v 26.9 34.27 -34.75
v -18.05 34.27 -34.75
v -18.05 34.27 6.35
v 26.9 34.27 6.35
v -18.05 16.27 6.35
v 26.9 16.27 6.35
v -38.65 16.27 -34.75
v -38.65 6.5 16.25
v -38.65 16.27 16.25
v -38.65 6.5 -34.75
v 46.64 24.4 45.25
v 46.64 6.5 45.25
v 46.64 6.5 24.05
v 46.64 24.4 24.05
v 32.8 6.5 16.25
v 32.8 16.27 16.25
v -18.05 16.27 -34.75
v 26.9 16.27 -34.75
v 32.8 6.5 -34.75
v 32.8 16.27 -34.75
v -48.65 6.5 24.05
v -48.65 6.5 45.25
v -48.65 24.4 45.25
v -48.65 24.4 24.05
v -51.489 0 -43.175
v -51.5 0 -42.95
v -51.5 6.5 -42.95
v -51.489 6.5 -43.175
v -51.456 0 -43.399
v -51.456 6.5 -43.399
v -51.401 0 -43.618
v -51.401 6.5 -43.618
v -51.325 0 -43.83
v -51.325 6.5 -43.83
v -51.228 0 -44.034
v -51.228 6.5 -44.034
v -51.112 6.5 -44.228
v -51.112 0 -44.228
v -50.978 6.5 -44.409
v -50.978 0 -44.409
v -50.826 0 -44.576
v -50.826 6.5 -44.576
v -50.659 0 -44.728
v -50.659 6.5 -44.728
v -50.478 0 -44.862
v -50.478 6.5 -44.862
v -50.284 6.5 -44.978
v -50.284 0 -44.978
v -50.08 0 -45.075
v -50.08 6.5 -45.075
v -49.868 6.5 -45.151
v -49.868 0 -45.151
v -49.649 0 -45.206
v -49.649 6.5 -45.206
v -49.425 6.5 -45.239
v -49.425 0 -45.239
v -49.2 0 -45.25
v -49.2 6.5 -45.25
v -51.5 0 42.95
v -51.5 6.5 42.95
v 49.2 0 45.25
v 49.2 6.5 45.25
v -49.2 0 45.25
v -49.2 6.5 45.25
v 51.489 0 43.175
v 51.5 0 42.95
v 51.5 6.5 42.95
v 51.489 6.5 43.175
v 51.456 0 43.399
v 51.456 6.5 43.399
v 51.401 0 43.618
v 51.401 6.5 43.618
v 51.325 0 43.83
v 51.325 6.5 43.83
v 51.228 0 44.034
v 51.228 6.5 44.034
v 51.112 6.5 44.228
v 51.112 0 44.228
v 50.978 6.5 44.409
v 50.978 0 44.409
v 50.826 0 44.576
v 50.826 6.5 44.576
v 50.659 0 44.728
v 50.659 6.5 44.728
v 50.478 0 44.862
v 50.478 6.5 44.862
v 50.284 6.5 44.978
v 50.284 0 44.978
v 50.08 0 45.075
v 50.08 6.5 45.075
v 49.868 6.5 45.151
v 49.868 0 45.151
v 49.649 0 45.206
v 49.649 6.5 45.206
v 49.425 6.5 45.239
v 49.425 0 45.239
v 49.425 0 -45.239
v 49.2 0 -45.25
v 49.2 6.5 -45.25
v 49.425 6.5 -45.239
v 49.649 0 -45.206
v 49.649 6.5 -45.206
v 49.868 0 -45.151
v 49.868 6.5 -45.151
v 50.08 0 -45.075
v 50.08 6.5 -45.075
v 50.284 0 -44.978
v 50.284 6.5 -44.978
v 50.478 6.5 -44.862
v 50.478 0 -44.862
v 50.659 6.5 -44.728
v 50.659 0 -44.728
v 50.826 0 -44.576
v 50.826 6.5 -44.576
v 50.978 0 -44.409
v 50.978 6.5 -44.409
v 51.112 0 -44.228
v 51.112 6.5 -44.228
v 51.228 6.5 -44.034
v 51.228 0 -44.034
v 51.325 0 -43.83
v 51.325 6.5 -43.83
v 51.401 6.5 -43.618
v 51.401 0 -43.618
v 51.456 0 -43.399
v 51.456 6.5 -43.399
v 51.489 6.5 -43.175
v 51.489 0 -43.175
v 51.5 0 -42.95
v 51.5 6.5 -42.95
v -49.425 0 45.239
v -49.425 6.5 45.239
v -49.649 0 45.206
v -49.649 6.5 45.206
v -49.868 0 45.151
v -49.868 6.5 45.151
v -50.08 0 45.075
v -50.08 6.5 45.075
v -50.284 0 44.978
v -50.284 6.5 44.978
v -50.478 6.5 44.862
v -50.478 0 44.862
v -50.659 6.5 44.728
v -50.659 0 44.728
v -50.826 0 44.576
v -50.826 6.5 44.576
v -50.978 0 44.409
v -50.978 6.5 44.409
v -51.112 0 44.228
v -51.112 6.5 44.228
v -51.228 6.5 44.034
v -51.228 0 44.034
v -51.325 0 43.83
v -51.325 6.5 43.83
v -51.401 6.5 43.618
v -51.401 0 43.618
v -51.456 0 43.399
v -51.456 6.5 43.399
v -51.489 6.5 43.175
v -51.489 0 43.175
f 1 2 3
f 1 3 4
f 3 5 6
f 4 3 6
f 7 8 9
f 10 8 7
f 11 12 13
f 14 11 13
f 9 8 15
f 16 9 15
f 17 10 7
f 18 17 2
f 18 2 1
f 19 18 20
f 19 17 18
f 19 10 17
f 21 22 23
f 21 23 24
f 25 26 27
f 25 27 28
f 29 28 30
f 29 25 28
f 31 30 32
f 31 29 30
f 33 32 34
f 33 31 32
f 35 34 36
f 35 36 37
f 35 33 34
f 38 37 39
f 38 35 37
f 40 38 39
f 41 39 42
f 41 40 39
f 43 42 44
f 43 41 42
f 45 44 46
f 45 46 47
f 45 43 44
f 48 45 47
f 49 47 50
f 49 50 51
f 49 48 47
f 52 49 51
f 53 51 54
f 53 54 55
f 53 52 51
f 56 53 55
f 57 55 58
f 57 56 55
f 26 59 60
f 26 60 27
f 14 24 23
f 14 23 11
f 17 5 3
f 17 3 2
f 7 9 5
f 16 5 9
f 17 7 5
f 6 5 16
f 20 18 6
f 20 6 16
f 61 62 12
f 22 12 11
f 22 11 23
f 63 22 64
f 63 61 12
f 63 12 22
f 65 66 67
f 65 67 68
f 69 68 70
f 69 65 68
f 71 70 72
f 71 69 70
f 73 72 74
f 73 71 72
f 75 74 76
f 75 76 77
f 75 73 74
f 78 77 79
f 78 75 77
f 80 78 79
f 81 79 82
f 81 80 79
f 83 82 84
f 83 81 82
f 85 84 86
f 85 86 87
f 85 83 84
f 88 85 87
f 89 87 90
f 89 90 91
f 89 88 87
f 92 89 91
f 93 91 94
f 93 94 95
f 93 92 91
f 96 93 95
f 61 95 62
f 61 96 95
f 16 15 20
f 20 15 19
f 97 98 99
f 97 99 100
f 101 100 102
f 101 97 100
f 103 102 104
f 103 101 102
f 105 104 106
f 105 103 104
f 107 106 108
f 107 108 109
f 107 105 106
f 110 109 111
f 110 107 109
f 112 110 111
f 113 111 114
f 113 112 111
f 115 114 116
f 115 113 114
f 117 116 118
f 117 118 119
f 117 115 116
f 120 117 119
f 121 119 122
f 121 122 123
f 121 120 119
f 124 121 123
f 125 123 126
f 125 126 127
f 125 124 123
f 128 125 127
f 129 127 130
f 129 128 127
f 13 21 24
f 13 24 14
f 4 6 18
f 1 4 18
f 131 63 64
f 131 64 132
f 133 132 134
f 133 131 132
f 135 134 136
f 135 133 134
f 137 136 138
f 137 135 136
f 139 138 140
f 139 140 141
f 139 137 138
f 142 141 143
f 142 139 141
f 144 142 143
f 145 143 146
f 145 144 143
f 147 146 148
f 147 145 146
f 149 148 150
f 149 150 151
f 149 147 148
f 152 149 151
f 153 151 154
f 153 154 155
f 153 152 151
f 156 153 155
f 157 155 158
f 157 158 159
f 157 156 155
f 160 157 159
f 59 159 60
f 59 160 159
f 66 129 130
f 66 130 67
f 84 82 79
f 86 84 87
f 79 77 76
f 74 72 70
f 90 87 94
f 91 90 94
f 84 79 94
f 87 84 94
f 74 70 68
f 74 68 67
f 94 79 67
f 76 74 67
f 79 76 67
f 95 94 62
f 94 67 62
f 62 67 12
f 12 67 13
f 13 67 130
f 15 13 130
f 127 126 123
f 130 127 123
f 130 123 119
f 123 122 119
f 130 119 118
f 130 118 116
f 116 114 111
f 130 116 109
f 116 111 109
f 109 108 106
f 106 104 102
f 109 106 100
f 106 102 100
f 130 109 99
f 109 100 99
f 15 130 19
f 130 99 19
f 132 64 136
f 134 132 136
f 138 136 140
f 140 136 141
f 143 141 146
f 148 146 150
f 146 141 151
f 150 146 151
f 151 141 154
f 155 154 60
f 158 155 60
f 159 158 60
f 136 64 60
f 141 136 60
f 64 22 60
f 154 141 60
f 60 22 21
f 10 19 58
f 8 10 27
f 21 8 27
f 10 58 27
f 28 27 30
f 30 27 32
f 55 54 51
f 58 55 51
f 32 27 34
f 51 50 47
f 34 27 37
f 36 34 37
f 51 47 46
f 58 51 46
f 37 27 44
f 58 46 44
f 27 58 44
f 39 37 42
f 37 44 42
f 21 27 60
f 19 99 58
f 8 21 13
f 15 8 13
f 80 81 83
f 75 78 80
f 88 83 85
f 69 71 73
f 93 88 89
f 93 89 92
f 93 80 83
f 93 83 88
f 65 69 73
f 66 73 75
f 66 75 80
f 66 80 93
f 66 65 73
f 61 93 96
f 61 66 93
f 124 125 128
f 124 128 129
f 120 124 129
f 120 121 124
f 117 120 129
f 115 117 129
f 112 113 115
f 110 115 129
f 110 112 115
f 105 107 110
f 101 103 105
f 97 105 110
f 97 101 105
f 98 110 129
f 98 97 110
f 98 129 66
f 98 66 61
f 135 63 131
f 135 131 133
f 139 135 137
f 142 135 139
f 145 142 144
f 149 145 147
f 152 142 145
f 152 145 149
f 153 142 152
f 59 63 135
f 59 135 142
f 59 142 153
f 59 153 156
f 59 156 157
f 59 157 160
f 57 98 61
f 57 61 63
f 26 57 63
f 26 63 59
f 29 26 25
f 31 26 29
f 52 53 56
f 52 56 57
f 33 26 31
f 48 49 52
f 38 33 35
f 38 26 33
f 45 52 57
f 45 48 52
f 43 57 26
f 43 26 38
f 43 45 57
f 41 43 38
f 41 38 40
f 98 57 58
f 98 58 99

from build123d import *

# Parameters (mm, degrees)
BOSS_EXTRUDE1_DEPTH = 6.5
SKETCH2_W           = 95.29
SKETCH2_H           = 21.2
BOSS_EXTRUDE2_DEPTH = 17.9
SKETCH3_W           = 71.45
SKETCH3_H           = 51
BOSS_EXTRUDE3_DEPTH = 9.77
SKETCH4_W           = 44.95
SKETCH4_H           = 41.1
BOSS_EXTRUDE4_DEPTH = 18


with BuildPart() as part:
    # Sketch1 → Boss-Extrude1 (new body)
    with BuildSketch(Plane(origin=(0, 0, 0), x_dir=(1, 0, 0), z_dir=(0, 1, 0))):
        with BuildLine():
            Line((-51.5, -42.95), (-51.5, 42.95))
            ThreePointArc((-51.5, 42.95), (-50.826345597, 44.576345597), (-49.2, 45.25))
            Line((-49.2, 45.25), (49.2, 45.25))
            ThreePointArc((49.2, 45.25), (50.826345597, 44.576345597), (51.5, 42.95))
            Line((51.5, 42.95), (51.5, -42.95))
            ThreePointArc((51.5, -42.95), (50.826345597, -44.576345597), (49.2, -45.25))
            Line((49.2, -45.25), (-49.2, -45.25))
            ThreePointArc((-49.2, -45.25), (-50.826345597, -44.576345597), (-51.5, -42.95))
        make_face()
    extrude(amount=BOSS_EXTRUDE1_DEPTH)

    # Sketch2 → Boss-Extrude2 (add)
    with BuildSketch(Plane(origin=(0, 6.5, 0), x_dir=(1, 0, 0), z_dir=(0, 1, 0))):
        with Locations((-1.005, -34.65)):
            Rectangle(SKETCH2_W, SKETCH2_H)
    extrude(amount=BOSS_EXTRUDE2_DEPTH)

    # Sketch3 → Boss-Extrude3 (add)
    with BuildSketch(Plane(origin=(0, 6.5, 0), x_dir=(1, 0, 0), z_dir=(0, 1, 0))):
        with Locations((-2.925, 9.25)):
            Rectangle(SKETCH3_W, SKETCH3_H)
    extrude(amount=BOSS_EXTRUDE3_DEPTH)

    # Sketch4 → Boss-Extrude4 (add)
    with BuildSketch(Plane(origin=(0, 16.27, 0), x_dir=(1, 0, 0), z_dir=(0, 1, 0))):
        with Locations((4.425, 14.2)):
            Rectangle(SKETCH4_W, SKETCH4_H)
    extrude(amount=BOSS_EXTRUDE4_DEPTH)


solid = part.part
